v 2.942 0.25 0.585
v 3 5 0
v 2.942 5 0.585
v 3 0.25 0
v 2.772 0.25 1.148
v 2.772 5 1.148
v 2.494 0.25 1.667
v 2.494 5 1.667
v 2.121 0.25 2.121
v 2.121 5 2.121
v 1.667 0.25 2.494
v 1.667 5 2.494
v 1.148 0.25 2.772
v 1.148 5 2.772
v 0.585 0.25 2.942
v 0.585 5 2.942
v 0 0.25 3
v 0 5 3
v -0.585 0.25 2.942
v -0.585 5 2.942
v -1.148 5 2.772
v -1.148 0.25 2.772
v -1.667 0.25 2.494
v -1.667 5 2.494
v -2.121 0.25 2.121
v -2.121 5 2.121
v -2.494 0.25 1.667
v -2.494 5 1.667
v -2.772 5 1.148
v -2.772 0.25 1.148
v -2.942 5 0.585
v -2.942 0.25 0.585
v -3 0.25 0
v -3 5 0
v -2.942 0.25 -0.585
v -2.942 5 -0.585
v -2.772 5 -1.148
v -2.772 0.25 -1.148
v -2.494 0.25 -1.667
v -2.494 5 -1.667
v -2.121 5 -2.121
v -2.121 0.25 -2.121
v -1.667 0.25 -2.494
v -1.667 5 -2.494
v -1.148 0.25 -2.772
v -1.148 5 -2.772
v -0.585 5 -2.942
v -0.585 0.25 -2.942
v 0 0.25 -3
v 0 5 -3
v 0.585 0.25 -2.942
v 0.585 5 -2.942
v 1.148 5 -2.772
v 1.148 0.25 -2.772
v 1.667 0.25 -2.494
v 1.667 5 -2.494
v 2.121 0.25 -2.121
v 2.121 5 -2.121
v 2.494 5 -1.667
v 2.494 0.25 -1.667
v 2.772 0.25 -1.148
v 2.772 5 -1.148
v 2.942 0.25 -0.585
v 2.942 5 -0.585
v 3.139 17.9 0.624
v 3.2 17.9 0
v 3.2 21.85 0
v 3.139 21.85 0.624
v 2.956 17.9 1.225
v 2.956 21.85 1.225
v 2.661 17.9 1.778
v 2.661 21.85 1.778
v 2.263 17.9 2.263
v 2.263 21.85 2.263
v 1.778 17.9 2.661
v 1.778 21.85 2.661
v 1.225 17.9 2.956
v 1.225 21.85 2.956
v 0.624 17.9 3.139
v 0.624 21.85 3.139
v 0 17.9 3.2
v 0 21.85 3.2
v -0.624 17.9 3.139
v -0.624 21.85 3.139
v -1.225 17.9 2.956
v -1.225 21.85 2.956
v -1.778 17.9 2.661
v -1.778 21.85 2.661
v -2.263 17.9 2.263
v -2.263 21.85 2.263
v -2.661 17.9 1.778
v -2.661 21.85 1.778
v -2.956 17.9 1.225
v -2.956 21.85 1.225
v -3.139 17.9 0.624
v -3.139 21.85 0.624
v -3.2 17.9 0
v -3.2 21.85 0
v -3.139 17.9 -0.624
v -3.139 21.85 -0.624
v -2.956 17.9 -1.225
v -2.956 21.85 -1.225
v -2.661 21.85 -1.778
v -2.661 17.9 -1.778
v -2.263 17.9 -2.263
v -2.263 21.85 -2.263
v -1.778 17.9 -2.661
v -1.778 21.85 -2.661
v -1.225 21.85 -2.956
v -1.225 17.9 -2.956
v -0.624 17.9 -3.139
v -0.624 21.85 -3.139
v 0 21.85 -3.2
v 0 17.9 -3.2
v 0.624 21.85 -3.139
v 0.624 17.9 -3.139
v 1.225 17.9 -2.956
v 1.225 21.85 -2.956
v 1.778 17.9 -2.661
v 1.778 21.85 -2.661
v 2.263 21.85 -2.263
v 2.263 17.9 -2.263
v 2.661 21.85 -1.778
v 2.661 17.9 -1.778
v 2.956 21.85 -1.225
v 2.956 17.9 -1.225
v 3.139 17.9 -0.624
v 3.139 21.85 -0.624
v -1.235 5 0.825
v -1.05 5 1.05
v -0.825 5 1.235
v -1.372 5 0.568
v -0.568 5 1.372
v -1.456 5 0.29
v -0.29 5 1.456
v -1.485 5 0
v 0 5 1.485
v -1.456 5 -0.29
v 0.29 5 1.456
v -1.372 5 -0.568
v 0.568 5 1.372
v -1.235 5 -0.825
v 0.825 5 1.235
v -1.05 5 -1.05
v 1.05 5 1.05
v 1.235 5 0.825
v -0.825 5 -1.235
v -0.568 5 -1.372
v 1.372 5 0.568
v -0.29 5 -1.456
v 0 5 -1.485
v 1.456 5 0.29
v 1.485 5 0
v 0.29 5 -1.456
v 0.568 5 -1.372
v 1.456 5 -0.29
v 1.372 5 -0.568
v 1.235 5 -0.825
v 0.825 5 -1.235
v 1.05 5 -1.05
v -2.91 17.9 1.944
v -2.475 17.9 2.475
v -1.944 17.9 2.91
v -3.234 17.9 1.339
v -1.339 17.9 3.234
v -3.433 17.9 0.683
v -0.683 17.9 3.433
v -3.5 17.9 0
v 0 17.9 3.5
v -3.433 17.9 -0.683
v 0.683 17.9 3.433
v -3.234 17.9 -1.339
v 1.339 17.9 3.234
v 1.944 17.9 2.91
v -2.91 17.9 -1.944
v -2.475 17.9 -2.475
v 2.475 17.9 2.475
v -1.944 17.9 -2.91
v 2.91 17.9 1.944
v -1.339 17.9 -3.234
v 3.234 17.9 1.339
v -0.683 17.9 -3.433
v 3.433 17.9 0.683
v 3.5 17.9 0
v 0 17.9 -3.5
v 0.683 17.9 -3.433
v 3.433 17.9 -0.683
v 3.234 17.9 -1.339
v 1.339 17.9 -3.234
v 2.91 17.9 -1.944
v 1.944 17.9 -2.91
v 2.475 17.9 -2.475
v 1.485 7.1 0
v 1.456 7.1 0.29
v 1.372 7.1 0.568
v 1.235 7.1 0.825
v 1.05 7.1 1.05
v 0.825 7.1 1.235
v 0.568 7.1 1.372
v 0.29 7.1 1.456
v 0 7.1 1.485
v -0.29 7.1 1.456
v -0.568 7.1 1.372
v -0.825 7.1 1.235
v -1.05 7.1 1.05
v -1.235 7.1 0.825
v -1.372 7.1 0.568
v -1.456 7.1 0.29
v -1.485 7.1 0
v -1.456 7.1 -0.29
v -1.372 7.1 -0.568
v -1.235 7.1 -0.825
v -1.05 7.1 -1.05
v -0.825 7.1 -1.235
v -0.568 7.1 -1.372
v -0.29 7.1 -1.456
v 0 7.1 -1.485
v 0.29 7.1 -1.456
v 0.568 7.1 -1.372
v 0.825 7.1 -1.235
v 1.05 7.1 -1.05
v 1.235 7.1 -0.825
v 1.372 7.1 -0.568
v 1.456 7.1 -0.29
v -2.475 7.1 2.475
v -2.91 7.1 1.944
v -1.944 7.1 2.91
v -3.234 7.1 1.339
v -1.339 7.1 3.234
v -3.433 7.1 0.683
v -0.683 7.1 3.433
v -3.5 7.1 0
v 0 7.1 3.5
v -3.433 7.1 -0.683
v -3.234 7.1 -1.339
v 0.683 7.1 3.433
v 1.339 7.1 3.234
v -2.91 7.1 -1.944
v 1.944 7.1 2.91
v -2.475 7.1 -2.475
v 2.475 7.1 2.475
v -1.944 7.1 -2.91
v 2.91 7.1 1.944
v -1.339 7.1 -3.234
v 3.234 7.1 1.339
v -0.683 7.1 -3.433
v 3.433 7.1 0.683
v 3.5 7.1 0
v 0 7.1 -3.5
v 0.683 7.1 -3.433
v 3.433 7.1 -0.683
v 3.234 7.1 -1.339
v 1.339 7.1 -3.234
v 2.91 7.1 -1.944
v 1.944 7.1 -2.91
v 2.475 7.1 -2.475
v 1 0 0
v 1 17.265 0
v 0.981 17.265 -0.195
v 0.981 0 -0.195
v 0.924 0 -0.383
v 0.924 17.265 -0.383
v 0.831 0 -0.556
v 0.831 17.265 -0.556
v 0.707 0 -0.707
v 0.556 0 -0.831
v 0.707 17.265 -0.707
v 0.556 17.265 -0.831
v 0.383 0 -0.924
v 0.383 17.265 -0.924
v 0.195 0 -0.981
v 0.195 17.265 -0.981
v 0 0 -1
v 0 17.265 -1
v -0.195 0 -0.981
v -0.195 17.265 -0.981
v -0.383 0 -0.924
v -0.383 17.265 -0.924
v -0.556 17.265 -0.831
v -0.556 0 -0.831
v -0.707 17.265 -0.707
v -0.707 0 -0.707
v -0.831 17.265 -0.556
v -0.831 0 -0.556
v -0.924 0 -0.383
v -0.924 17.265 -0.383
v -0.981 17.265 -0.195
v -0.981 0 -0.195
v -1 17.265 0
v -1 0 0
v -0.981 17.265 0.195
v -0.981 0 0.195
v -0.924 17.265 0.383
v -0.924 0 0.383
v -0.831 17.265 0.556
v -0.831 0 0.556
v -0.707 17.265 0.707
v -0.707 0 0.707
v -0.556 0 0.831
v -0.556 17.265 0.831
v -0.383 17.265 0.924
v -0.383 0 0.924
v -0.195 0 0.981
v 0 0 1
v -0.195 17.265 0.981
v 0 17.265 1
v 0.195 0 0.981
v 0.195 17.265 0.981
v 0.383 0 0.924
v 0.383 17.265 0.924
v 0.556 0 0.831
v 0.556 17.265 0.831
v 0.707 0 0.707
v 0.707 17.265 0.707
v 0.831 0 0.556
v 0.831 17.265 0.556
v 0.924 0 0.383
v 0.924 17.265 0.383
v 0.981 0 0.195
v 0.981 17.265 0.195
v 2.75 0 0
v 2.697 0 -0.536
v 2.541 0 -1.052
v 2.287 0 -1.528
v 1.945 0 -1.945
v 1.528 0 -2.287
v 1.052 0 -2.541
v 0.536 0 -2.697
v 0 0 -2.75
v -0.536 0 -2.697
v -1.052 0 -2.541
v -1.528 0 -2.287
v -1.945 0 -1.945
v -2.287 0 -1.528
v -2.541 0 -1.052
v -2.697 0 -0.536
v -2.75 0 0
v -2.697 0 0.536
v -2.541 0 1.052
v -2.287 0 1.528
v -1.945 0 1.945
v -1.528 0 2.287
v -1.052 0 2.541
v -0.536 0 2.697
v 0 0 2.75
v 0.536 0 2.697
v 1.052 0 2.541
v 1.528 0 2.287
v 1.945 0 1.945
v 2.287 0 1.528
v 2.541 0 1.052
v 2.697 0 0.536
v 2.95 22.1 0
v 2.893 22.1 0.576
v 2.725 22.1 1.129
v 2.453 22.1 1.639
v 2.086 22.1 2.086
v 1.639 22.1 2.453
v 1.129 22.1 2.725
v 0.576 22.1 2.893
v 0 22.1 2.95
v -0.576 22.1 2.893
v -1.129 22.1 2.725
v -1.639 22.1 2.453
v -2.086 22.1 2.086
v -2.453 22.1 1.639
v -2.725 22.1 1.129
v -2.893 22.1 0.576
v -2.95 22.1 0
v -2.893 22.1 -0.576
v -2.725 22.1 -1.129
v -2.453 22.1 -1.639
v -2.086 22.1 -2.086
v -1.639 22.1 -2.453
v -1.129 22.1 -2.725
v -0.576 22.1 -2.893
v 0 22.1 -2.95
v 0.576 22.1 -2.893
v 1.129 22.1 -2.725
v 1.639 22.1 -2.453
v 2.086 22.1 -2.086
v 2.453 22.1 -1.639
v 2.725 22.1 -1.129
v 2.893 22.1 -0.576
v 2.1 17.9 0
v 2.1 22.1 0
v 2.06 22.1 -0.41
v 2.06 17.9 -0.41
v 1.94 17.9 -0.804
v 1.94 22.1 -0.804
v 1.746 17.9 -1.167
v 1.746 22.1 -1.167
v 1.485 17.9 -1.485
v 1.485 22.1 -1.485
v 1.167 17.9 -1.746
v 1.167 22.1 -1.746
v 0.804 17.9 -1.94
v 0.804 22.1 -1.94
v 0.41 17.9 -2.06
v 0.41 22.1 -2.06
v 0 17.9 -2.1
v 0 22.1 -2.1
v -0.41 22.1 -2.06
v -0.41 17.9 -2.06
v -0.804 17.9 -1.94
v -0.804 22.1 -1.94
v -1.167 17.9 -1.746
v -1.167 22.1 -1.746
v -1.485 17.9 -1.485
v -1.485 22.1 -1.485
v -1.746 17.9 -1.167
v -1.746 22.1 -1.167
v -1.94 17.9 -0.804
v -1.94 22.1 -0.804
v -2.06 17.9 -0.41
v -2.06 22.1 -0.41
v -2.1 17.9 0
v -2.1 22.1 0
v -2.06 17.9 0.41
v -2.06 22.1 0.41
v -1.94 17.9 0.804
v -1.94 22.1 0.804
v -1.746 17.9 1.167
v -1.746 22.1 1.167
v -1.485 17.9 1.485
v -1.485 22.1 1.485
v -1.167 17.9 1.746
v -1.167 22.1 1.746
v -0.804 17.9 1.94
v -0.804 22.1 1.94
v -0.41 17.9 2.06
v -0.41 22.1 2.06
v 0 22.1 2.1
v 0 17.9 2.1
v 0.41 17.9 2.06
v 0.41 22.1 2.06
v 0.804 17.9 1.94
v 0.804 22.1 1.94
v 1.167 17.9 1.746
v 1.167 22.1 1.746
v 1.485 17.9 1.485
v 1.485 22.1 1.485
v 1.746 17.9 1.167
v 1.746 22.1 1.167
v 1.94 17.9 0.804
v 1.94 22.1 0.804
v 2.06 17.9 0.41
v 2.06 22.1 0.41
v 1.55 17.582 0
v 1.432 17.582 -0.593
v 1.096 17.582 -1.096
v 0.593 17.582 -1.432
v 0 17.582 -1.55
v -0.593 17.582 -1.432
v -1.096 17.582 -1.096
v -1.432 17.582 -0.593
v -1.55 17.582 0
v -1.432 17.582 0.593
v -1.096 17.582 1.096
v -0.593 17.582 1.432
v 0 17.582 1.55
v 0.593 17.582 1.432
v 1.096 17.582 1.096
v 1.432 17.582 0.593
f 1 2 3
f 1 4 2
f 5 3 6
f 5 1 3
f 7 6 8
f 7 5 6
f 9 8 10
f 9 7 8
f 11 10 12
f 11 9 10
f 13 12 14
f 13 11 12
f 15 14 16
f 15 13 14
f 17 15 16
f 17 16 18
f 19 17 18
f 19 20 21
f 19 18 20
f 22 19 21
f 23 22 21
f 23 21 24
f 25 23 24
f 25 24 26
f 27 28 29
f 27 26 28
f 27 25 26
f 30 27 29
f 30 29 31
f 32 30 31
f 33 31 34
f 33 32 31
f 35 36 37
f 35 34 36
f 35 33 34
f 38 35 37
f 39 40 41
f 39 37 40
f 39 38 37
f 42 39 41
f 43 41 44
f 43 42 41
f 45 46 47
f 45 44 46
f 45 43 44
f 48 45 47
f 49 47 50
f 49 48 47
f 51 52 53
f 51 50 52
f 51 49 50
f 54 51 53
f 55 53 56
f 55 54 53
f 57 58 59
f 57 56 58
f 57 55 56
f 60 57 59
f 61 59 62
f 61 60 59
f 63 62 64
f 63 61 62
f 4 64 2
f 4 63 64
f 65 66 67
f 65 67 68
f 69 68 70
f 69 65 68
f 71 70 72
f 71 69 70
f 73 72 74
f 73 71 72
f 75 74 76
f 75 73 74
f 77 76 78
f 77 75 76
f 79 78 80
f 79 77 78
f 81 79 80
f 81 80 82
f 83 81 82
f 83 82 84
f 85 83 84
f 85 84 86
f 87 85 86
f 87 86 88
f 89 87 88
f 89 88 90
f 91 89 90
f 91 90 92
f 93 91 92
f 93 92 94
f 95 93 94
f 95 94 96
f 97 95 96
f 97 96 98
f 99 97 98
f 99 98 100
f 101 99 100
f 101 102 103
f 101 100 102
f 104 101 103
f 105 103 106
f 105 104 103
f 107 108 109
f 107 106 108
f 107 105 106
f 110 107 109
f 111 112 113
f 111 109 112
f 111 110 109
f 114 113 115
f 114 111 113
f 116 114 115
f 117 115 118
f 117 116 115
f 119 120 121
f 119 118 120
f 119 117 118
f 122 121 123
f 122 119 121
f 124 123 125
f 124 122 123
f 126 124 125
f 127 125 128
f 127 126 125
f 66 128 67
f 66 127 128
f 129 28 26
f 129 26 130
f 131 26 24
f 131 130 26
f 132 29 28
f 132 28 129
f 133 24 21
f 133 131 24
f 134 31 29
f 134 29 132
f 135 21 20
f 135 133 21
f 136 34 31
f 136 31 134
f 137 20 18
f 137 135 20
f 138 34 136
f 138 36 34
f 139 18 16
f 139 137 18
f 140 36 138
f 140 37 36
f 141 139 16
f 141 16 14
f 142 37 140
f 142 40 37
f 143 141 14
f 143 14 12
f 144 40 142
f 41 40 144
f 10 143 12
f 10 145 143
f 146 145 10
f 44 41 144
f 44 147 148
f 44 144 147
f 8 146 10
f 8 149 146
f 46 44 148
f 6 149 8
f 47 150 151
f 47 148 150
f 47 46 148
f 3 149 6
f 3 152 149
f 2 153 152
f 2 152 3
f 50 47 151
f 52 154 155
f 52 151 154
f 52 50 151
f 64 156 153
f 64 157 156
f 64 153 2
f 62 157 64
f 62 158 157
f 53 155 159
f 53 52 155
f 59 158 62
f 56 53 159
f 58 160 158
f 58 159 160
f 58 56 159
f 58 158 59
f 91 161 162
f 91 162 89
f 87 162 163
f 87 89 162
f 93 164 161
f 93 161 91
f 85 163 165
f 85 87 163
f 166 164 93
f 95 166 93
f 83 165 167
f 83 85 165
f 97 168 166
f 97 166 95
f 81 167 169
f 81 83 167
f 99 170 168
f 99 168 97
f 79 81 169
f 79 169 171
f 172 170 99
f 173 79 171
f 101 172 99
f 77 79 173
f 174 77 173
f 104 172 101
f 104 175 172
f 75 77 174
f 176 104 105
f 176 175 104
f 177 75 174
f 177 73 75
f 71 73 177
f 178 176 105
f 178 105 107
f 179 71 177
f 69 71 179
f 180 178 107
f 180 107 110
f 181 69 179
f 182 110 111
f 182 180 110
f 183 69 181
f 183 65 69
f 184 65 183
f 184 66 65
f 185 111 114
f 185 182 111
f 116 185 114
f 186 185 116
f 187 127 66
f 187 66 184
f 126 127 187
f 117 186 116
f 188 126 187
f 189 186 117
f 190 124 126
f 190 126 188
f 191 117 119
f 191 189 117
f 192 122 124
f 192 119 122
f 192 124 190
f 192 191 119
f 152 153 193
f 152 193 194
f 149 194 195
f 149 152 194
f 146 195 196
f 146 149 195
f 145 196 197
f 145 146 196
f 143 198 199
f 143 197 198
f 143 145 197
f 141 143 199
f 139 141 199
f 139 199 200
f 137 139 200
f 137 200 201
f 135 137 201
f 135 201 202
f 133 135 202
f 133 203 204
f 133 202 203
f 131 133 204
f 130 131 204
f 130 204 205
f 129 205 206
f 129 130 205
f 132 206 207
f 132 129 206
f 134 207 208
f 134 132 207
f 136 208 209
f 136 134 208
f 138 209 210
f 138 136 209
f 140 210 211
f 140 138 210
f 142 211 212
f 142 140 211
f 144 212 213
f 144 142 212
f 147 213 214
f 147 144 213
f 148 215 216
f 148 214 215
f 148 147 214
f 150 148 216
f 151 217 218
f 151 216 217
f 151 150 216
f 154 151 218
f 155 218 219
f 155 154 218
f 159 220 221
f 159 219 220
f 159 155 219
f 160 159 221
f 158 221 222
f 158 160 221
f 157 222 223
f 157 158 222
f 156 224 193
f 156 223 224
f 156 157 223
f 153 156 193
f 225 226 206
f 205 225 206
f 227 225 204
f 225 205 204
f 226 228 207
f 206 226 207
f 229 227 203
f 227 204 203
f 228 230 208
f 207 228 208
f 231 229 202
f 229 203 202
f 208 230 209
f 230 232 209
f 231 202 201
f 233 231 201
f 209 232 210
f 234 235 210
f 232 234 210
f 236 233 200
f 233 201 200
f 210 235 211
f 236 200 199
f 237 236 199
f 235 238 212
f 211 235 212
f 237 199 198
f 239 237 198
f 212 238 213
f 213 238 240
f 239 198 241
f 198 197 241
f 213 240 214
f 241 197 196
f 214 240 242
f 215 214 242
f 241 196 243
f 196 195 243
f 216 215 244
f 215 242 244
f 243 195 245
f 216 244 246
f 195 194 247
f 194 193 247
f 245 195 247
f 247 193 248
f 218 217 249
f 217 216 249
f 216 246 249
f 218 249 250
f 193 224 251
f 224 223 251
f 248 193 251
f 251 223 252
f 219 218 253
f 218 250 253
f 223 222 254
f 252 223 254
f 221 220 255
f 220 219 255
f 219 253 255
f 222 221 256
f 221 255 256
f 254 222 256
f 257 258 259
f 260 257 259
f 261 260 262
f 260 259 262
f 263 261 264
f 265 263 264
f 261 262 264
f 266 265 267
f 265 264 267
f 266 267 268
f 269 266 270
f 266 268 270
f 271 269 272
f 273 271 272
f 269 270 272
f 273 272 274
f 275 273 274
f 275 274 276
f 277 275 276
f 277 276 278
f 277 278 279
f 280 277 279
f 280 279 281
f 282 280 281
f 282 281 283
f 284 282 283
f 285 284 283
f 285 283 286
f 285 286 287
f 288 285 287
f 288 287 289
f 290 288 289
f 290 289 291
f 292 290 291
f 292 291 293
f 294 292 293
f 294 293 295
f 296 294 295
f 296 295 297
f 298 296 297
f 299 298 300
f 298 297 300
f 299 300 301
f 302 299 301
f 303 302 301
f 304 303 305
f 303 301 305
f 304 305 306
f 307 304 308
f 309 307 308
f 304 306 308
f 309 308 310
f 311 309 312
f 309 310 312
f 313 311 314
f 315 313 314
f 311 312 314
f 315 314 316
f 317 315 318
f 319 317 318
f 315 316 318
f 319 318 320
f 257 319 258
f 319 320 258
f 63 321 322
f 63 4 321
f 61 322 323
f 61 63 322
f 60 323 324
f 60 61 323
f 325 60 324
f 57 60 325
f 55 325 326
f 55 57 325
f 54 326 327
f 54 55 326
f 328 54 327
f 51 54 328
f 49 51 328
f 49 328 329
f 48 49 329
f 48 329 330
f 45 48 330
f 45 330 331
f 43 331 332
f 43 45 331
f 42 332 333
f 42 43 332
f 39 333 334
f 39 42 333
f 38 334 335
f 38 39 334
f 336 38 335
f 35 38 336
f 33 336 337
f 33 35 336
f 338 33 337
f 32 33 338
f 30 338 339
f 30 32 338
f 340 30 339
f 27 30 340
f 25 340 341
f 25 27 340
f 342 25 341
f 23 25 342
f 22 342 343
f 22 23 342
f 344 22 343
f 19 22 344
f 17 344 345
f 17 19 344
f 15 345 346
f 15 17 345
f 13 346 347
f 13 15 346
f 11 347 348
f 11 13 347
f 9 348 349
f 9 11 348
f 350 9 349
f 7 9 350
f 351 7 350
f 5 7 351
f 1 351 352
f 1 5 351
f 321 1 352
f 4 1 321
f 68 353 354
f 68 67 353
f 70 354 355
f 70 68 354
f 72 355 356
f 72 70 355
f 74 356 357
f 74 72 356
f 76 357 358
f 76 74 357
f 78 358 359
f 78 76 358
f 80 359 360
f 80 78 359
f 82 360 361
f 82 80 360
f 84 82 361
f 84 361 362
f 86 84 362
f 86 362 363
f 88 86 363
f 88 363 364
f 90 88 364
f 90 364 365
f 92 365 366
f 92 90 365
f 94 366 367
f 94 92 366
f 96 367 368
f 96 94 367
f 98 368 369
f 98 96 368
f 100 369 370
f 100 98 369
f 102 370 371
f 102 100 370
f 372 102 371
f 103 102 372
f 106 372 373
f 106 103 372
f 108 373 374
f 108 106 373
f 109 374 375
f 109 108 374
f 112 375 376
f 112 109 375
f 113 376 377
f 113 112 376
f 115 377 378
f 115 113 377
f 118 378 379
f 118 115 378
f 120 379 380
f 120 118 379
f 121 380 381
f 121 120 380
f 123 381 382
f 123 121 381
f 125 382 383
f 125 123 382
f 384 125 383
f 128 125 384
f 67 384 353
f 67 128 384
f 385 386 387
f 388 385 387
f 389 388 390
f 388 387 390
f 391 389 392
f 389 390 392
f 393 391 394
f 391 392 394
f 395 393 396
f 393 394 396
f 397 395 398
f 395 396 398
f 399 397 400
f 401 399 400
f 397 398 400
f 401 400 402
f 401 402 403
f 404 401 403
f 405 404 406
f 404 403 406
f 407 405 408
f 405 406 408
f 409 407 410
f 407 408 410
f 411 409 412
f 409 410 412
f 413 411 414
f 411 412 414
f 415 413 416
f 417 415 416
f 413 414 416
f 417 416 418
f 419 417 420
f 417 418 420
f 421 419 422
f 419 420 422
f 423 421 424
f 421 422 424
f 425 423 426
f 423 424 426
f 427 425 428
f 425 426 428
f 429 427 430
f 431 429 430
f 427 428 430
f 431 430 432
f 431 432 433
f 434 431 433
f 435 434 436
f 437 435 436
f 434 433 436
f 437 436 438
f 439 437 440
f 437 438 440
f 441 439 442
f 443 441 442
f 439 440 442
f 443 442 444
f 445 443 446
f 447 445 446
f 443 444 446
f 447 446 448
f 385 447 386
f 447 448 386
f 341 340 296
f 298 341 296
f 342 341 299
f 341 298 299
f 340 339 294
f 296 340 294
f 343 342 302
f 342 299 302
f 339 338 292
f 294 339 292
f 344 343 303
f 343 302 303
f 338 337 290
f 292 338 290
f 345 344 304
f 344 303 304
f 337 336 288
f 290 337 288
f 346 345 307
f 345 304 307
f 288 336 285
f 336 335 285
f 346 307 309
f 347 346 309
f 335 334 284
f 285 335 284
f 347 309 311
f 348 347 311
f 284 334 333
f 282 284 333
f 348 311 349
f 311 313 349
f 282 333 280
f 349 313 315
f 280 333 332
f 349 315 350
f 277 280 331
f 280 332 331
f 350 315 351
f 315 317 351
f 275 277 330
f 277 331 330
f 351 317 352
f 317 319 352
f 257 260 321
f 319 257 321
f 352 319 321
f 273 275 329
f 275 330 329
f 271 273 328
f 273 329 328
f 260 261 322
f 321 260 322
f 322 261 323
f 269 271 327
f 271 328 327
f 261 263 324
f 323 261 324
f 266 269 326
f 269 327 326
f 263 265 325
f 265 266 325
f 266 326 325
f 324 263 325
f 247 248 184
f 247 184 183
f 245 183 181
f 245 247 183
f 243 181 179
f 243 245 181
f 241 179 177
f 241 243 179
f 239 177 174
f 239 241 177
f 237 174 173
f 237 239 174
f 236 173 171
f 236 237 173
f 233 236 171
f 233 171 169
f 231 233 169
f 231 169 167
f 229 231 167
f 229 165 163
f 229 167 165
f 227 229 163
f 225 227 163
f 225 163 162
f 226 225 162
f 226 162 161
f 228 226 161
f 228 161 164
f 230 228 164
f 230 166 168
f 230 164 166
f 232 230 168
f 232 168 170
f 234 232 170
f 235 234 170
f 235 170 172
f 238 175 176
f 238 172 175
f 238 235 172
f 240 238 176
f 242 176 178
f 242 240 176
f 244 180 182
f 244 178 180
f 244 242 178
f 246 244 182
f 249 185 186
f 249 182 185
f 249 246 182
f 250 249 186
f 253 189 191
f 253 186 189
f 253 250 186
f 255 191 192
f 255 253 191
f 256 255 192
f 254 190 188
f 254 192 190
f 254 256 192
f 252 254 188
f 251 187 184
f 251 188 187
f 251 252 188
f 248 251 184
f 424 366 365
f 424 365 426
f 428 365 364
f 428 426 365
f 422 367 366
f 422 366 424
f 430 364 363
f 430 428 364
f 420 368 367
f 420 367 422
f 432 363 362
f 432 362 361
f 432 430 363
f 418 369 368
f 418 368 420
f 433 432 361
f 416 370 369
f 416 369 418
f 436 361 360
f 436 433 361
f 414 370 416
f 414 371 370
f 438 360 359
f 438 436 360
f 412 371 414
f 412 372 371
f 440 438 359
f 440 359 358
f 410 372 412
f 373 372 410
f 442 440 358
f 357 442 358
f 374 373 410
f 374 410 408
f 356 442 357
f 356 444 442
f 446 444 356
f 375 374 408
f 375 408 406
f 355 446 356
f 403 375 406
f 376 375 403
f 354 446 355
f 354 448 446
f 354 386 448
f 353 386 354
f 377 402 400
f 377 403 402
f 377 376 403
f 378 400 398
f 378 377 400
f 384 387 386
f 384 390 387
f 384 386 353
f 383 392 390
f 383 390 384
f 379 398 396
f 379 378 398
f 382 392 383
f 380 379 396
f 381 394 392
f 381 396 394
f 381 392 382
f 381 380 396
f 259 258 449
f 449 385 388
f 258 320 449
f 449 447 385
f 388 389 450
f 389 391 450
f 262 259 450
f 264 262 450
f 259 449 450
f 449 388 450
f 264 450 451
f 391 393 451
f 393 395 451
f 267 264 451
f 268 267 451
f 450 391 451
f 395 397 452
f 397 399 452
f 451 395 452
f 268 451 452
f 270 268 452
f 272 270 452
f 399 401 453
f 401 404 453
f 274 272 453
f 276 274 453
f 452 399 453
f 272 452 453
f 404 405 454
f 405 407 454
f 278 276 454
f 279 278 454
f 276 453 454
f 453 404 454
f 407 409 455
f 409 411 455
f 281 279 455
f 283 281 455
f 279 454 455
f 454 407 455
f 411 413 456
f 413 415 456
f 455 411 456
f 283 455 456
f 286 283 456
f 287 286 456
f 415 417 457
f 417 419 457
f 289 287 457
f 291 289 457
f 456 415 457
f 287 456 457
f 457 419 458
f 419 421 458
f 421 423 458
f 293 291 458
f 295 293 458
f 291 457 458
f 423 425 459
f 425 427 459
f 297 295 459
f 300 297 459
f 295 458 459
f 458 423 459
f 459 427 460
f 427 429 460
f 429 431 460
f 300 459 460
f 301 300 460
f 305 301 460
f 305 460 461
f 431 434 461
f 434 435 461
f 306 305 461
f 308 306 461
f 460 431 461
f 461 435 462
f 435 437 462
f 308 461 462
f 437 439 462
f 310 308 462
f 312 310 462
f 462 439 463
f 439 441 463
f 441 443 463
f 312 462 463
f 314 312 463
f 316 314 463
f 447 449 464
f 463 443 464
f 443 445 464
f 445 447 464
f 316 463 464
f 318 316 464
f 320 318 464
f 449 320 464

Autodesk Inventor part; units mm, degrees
ref_plane "YZ Plane" through (0, 0, 0) normal (1, 0, 0) x (0, 1, 0)
ref_plane "XZ Plane" through (0, 0, 0) normal (0, 1, 0) x (-1, 0, 0)
ref_plane "XY Plane" through (0, 0, 0) normal (0, 0, 1) x (1, 0, 0)
sketch "Skizze1" plane through (0, 0, 0) normal (0, 0, 1) x (1, 0, 0)
  line L0 (1, 0) -> (1, 17.2649)
  line L1 (1, 17.2649) -> (2.1, 17.9)
  line L2 (2.1, 17.9) -> (2.1, 22.1)
  line L3 (2.1, 22.1) -> (3.2, 22.1)
  line L4 (3.2, 22.1) -> (3.2, 17.9)
  line L5 (3.2, 17.9) -> (3.5, 17.9)
  line L6 (3.5, 17.9) -> (3.5, 7.1)
  line L7 (3.5, 7.1) -> (1.485, 7.1)
  line L8 (1.485, 7.1) -> (1.485, 5)
  line L9 (1.485, 5) -> (3, 5)
  line L10 (3, 5) -> (3, 0)
  line L11 (3, 0) -> (1, 0)
  line L12 (0, -4.42) -> (0, 26.52) projected
  point P0 (0, 0)
  dimension "d0" = 120
  dimension "d1" = 1
  dimension "d2" = 1.485
  dimension "d3" = 0
  dimension "d4" = 5
  dimension "d5" = 2.1
  dimension "d6" = 15
  dimension "d7" = 2.1
  dimension "d8" = 3.5
  dimension "d9" = 3
  dimension "d10" = 0
  dimension "d11" = 4.2
  dimension "d12" = 3.2
revolve "Umdrehung1" add sketch "Skizze1" angle 360 about axis through (0, -10, 0) along (0, 1, 0)
chamfer "Fase1" distance 0.25 angle 45 2 edges at (-3.2, 22.1, 0) (-3, 0, 0)
thread "Gewinde1" size "M7x1" class "6g" standard "ANSI Metric M Profile" full length
thread "Gewinde2" size "M6x1" class "6g" standard "ANSI Metric M Profile" full length
properties part number "E3D-v6 1.75mm Heat Break" material "Edelstahl, 440C"
